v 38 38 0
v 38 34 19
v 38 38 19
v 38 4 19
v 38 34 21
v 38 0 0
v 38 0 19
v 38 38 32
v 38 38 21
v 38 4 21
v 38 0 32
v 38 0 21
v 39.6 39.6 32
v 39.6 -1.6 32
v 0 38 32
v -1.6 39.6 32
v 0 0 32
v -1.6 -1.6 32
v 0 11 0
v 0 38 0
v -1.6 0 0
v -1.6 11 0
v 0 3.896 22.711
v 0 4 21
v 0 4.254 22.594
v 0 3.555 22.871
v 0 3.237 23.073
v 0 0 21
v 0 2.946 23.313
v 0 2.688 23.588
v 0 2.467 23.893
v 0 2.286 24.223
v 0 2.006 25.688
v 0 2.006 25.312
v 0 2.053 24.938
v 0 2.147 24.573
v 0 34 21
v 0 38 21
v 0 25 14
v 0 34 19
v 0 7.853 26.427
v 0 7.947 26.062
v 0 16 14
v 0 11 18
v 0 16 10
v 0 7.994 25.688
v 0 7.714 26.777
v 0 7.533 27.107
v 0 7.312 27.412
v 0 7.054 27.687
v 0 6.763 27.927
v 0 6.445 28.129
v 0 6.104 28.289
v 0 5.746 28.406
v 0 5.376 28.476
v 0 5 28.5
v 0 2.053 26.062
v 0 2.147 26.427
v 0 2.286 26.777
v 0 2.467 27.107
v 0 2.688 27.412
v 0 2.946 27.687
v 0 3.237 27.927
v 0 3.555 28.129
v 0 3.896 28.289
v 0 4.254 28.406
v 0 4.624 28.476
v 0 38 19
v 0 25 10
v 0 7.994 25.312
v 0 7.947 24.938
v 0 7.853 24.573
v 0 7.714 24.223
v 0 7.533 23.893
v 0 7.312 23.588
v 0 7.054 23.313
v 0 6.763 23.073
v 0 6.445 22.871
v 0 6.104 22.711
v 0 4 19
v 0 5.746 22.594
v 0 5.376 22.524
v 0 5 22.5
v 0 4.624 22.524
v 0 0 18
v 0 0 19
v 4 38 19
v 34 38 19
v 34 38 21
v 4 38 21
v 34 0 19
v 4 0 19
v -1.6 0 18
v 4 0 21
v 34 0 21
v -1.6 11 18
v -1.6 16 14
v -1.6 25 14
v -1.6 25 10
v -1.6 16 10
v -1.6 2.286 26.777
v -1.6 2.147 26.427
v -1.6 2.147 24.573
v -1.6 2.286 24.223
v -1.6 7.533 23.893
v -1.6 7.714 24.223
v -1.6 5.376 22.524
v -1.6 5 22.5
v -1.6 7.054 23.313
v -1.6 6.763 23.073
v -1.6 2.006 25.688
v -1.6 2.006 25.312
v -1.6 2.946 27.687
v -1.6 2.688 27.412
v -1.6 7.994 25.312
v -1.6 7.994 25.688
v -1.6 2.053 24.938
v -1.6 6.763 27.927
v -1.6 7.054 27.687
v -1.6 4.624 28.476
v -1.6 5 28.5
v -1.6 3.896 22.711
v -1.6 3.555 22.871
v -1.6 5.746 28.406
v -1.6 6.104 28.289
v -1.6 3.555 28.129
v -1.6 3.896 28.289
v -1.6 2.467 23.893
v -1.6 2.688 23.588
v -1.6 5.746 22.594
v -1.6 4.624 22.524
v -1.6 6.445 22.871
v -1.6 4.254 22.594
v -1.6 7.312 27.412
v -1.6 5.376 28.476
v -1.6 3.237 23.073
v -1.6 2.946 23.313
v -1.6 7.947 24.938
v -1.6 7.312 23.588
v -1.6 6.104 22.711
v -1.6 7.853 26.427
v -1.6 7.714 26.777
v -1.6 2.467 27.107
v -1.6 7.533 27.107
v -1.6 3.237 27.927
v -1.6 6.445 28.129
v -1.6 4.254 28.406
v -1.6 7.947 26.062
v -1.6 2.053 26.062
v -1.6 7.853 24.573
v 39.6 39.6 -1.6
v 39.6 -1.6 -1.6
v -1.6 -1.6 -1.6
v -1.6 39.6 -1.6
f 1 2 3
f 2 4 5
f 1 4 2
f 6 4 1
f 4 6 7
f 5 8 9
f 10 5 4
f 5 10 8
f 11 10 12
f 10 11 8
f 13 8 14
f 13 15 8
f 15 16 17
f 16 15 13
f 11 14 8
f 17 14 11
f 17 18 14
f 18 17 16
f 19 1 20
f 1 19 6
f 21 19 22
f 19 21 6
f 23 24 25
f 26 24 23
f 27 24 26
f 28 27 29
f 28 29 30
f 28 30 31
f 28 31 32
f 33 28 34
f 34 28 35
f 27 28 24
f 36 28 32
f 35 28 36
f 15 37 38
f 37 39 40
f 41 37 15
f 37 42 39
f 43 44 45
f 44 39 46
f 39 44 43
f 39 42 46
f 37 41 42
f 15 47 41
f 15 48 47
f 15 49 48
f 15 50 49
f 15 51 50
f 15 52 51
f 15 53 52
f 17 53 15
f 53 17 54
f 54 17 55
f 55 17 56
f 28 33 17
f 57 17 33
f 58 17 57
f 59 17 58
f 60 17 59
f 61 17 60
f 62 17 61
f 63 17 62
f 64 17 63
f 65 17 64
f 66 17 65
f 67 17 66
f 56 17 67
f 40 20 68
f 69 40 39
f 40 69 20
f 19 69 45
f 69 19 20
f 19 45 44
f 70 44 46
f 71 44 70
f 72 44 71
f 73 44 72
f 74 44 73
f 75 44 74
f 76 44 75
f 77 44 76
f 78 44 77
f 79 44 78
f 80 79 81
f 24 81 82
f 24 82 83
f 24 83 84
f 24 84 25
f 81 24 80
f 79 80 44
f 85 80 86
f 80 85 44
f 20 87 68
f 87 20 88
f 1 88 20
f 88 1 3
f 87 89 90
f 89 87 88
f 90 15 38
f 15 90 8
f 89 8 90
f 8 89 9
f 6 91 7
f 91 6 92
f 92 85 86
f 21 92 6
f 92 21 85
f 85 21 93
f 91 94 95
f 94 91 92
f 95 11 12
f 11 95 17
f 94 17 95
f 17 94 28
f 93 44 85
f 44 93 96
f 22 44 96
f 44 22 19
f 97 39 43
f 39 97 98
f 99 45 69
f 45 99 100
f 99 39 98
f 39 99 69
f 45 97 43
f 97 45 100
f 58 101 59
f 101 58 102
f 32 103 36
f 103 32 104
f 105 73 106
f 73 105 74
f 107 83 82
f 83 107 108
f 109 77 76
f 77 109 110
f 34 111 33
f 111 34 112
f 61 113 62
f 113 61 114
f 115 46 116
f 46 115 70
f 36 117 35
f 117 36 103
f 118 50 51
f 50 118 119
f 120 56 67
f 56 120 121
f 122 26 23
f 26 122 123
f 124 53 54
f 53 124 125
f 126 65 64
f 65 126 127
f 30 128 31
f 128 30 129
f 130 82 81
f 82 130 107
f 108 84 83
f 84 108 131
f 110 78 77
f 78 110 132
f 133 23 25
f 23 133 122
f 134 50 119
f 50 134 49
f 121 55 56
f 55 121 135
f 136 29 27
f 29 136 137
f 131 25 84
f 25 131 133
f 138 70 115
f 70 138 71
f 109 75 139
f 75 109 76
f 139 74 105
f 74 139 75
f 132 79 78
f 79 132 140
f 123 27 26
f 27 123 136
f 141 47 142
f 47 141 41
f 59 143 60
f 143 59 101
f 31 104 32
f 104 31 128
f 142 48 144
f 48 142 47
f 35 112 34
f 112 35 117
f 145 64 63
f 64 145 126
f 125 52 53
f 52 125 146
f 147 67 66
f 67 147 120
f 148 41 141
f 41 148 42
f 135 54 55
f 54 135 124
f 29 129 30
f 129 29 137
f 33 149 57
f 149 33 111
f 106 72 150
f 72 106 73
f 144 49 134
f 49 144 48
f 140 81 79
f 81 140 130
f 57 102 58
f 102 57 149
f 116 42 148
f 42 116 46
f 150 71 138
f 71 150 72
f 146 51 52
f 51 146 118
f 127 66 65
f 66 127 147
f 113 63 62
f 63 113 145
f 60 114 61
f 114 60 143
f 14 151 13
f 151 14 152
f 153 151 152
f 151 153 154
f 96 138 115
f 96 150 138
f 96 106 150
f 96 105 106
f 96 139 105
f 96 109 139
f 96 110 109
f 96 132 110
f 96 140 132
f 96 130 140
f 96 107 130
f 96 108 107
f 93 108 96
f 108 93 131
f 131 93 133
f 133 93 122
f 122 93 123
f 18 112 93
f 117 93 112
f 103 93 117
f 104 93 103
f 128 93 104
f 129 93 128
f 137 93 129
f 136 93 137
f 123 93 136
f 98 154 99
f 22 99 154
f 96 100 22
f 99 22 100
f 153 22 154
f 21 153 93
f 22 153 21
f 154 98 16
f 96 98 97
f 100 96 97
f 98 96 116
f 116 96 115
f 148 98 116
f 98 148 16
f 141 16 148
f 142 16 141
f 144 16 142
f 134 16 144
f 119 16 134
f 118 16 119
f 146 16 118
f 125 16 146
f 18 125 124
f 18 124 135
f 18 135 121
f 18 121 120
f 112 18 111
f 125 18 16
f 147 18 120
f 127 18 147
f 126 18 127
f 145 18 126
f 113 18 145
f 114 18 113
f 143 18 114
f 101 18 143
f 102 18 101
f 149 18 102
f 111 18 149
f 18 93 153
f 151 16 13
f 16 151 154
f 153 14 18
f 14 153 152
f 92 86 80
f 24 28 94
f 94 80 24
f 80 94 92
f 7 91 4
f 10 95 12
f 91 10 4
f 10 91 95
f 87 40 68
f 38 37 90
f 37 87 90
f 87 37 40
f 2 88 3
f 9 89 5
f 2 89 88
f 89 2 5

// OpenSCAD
$fn=50;
wand=4*0.4;
X=38;
Y=38;
Z=30;
rand=2;
bohrung=-5;
union() {
    
difference(){
    translate([-wand,-wand,-wand])cube([X+2*wand,Y+2*wand,Z+wand+rand]);
    union() {cube([X,Y,Z+rand]);
        translate([bohrung,0,0])cube([10,11,18]);
        translate([bohrung,Y-22,10])cube([10,9,4]);
        translate([bohrung,5,Z-3-1.5])rotate([0,90,0])cylinder(d=6,h=10);
    }
}
translate([0,4,Z-11])rotate([0,0,-90])tri_angle(4,4,2);
translate([X-4,0,Z-11])rotate([0,0,0])tri_angle(4,4,2);
translate([4,Y,Z-11])rotate([0,0,-180])tri_angle(4,4,2);
translate([X,Y-4,Z-11])rotate([0,0,90])tri_angle(4,4,2);
}

module tri_angle(a, b, wall, direction=0)
{
    myPoints=[
    [[0,0],[a,0],[a,b]],
    [[0,0],[a,0],[0,b]],
    [[0,0],[a,0],[0,b]],
    [[0,0],[a,0],[0,b]]
    ];
    myRotate=[
    [0,0,0],
    [0,0,0],
    [90,0,0],
    [90,0,90]
    ];
    
    rotate(myRotate[direction])
        linear_extrude(height = wall) 
            polygon( points=myPoints[direction]);
}
